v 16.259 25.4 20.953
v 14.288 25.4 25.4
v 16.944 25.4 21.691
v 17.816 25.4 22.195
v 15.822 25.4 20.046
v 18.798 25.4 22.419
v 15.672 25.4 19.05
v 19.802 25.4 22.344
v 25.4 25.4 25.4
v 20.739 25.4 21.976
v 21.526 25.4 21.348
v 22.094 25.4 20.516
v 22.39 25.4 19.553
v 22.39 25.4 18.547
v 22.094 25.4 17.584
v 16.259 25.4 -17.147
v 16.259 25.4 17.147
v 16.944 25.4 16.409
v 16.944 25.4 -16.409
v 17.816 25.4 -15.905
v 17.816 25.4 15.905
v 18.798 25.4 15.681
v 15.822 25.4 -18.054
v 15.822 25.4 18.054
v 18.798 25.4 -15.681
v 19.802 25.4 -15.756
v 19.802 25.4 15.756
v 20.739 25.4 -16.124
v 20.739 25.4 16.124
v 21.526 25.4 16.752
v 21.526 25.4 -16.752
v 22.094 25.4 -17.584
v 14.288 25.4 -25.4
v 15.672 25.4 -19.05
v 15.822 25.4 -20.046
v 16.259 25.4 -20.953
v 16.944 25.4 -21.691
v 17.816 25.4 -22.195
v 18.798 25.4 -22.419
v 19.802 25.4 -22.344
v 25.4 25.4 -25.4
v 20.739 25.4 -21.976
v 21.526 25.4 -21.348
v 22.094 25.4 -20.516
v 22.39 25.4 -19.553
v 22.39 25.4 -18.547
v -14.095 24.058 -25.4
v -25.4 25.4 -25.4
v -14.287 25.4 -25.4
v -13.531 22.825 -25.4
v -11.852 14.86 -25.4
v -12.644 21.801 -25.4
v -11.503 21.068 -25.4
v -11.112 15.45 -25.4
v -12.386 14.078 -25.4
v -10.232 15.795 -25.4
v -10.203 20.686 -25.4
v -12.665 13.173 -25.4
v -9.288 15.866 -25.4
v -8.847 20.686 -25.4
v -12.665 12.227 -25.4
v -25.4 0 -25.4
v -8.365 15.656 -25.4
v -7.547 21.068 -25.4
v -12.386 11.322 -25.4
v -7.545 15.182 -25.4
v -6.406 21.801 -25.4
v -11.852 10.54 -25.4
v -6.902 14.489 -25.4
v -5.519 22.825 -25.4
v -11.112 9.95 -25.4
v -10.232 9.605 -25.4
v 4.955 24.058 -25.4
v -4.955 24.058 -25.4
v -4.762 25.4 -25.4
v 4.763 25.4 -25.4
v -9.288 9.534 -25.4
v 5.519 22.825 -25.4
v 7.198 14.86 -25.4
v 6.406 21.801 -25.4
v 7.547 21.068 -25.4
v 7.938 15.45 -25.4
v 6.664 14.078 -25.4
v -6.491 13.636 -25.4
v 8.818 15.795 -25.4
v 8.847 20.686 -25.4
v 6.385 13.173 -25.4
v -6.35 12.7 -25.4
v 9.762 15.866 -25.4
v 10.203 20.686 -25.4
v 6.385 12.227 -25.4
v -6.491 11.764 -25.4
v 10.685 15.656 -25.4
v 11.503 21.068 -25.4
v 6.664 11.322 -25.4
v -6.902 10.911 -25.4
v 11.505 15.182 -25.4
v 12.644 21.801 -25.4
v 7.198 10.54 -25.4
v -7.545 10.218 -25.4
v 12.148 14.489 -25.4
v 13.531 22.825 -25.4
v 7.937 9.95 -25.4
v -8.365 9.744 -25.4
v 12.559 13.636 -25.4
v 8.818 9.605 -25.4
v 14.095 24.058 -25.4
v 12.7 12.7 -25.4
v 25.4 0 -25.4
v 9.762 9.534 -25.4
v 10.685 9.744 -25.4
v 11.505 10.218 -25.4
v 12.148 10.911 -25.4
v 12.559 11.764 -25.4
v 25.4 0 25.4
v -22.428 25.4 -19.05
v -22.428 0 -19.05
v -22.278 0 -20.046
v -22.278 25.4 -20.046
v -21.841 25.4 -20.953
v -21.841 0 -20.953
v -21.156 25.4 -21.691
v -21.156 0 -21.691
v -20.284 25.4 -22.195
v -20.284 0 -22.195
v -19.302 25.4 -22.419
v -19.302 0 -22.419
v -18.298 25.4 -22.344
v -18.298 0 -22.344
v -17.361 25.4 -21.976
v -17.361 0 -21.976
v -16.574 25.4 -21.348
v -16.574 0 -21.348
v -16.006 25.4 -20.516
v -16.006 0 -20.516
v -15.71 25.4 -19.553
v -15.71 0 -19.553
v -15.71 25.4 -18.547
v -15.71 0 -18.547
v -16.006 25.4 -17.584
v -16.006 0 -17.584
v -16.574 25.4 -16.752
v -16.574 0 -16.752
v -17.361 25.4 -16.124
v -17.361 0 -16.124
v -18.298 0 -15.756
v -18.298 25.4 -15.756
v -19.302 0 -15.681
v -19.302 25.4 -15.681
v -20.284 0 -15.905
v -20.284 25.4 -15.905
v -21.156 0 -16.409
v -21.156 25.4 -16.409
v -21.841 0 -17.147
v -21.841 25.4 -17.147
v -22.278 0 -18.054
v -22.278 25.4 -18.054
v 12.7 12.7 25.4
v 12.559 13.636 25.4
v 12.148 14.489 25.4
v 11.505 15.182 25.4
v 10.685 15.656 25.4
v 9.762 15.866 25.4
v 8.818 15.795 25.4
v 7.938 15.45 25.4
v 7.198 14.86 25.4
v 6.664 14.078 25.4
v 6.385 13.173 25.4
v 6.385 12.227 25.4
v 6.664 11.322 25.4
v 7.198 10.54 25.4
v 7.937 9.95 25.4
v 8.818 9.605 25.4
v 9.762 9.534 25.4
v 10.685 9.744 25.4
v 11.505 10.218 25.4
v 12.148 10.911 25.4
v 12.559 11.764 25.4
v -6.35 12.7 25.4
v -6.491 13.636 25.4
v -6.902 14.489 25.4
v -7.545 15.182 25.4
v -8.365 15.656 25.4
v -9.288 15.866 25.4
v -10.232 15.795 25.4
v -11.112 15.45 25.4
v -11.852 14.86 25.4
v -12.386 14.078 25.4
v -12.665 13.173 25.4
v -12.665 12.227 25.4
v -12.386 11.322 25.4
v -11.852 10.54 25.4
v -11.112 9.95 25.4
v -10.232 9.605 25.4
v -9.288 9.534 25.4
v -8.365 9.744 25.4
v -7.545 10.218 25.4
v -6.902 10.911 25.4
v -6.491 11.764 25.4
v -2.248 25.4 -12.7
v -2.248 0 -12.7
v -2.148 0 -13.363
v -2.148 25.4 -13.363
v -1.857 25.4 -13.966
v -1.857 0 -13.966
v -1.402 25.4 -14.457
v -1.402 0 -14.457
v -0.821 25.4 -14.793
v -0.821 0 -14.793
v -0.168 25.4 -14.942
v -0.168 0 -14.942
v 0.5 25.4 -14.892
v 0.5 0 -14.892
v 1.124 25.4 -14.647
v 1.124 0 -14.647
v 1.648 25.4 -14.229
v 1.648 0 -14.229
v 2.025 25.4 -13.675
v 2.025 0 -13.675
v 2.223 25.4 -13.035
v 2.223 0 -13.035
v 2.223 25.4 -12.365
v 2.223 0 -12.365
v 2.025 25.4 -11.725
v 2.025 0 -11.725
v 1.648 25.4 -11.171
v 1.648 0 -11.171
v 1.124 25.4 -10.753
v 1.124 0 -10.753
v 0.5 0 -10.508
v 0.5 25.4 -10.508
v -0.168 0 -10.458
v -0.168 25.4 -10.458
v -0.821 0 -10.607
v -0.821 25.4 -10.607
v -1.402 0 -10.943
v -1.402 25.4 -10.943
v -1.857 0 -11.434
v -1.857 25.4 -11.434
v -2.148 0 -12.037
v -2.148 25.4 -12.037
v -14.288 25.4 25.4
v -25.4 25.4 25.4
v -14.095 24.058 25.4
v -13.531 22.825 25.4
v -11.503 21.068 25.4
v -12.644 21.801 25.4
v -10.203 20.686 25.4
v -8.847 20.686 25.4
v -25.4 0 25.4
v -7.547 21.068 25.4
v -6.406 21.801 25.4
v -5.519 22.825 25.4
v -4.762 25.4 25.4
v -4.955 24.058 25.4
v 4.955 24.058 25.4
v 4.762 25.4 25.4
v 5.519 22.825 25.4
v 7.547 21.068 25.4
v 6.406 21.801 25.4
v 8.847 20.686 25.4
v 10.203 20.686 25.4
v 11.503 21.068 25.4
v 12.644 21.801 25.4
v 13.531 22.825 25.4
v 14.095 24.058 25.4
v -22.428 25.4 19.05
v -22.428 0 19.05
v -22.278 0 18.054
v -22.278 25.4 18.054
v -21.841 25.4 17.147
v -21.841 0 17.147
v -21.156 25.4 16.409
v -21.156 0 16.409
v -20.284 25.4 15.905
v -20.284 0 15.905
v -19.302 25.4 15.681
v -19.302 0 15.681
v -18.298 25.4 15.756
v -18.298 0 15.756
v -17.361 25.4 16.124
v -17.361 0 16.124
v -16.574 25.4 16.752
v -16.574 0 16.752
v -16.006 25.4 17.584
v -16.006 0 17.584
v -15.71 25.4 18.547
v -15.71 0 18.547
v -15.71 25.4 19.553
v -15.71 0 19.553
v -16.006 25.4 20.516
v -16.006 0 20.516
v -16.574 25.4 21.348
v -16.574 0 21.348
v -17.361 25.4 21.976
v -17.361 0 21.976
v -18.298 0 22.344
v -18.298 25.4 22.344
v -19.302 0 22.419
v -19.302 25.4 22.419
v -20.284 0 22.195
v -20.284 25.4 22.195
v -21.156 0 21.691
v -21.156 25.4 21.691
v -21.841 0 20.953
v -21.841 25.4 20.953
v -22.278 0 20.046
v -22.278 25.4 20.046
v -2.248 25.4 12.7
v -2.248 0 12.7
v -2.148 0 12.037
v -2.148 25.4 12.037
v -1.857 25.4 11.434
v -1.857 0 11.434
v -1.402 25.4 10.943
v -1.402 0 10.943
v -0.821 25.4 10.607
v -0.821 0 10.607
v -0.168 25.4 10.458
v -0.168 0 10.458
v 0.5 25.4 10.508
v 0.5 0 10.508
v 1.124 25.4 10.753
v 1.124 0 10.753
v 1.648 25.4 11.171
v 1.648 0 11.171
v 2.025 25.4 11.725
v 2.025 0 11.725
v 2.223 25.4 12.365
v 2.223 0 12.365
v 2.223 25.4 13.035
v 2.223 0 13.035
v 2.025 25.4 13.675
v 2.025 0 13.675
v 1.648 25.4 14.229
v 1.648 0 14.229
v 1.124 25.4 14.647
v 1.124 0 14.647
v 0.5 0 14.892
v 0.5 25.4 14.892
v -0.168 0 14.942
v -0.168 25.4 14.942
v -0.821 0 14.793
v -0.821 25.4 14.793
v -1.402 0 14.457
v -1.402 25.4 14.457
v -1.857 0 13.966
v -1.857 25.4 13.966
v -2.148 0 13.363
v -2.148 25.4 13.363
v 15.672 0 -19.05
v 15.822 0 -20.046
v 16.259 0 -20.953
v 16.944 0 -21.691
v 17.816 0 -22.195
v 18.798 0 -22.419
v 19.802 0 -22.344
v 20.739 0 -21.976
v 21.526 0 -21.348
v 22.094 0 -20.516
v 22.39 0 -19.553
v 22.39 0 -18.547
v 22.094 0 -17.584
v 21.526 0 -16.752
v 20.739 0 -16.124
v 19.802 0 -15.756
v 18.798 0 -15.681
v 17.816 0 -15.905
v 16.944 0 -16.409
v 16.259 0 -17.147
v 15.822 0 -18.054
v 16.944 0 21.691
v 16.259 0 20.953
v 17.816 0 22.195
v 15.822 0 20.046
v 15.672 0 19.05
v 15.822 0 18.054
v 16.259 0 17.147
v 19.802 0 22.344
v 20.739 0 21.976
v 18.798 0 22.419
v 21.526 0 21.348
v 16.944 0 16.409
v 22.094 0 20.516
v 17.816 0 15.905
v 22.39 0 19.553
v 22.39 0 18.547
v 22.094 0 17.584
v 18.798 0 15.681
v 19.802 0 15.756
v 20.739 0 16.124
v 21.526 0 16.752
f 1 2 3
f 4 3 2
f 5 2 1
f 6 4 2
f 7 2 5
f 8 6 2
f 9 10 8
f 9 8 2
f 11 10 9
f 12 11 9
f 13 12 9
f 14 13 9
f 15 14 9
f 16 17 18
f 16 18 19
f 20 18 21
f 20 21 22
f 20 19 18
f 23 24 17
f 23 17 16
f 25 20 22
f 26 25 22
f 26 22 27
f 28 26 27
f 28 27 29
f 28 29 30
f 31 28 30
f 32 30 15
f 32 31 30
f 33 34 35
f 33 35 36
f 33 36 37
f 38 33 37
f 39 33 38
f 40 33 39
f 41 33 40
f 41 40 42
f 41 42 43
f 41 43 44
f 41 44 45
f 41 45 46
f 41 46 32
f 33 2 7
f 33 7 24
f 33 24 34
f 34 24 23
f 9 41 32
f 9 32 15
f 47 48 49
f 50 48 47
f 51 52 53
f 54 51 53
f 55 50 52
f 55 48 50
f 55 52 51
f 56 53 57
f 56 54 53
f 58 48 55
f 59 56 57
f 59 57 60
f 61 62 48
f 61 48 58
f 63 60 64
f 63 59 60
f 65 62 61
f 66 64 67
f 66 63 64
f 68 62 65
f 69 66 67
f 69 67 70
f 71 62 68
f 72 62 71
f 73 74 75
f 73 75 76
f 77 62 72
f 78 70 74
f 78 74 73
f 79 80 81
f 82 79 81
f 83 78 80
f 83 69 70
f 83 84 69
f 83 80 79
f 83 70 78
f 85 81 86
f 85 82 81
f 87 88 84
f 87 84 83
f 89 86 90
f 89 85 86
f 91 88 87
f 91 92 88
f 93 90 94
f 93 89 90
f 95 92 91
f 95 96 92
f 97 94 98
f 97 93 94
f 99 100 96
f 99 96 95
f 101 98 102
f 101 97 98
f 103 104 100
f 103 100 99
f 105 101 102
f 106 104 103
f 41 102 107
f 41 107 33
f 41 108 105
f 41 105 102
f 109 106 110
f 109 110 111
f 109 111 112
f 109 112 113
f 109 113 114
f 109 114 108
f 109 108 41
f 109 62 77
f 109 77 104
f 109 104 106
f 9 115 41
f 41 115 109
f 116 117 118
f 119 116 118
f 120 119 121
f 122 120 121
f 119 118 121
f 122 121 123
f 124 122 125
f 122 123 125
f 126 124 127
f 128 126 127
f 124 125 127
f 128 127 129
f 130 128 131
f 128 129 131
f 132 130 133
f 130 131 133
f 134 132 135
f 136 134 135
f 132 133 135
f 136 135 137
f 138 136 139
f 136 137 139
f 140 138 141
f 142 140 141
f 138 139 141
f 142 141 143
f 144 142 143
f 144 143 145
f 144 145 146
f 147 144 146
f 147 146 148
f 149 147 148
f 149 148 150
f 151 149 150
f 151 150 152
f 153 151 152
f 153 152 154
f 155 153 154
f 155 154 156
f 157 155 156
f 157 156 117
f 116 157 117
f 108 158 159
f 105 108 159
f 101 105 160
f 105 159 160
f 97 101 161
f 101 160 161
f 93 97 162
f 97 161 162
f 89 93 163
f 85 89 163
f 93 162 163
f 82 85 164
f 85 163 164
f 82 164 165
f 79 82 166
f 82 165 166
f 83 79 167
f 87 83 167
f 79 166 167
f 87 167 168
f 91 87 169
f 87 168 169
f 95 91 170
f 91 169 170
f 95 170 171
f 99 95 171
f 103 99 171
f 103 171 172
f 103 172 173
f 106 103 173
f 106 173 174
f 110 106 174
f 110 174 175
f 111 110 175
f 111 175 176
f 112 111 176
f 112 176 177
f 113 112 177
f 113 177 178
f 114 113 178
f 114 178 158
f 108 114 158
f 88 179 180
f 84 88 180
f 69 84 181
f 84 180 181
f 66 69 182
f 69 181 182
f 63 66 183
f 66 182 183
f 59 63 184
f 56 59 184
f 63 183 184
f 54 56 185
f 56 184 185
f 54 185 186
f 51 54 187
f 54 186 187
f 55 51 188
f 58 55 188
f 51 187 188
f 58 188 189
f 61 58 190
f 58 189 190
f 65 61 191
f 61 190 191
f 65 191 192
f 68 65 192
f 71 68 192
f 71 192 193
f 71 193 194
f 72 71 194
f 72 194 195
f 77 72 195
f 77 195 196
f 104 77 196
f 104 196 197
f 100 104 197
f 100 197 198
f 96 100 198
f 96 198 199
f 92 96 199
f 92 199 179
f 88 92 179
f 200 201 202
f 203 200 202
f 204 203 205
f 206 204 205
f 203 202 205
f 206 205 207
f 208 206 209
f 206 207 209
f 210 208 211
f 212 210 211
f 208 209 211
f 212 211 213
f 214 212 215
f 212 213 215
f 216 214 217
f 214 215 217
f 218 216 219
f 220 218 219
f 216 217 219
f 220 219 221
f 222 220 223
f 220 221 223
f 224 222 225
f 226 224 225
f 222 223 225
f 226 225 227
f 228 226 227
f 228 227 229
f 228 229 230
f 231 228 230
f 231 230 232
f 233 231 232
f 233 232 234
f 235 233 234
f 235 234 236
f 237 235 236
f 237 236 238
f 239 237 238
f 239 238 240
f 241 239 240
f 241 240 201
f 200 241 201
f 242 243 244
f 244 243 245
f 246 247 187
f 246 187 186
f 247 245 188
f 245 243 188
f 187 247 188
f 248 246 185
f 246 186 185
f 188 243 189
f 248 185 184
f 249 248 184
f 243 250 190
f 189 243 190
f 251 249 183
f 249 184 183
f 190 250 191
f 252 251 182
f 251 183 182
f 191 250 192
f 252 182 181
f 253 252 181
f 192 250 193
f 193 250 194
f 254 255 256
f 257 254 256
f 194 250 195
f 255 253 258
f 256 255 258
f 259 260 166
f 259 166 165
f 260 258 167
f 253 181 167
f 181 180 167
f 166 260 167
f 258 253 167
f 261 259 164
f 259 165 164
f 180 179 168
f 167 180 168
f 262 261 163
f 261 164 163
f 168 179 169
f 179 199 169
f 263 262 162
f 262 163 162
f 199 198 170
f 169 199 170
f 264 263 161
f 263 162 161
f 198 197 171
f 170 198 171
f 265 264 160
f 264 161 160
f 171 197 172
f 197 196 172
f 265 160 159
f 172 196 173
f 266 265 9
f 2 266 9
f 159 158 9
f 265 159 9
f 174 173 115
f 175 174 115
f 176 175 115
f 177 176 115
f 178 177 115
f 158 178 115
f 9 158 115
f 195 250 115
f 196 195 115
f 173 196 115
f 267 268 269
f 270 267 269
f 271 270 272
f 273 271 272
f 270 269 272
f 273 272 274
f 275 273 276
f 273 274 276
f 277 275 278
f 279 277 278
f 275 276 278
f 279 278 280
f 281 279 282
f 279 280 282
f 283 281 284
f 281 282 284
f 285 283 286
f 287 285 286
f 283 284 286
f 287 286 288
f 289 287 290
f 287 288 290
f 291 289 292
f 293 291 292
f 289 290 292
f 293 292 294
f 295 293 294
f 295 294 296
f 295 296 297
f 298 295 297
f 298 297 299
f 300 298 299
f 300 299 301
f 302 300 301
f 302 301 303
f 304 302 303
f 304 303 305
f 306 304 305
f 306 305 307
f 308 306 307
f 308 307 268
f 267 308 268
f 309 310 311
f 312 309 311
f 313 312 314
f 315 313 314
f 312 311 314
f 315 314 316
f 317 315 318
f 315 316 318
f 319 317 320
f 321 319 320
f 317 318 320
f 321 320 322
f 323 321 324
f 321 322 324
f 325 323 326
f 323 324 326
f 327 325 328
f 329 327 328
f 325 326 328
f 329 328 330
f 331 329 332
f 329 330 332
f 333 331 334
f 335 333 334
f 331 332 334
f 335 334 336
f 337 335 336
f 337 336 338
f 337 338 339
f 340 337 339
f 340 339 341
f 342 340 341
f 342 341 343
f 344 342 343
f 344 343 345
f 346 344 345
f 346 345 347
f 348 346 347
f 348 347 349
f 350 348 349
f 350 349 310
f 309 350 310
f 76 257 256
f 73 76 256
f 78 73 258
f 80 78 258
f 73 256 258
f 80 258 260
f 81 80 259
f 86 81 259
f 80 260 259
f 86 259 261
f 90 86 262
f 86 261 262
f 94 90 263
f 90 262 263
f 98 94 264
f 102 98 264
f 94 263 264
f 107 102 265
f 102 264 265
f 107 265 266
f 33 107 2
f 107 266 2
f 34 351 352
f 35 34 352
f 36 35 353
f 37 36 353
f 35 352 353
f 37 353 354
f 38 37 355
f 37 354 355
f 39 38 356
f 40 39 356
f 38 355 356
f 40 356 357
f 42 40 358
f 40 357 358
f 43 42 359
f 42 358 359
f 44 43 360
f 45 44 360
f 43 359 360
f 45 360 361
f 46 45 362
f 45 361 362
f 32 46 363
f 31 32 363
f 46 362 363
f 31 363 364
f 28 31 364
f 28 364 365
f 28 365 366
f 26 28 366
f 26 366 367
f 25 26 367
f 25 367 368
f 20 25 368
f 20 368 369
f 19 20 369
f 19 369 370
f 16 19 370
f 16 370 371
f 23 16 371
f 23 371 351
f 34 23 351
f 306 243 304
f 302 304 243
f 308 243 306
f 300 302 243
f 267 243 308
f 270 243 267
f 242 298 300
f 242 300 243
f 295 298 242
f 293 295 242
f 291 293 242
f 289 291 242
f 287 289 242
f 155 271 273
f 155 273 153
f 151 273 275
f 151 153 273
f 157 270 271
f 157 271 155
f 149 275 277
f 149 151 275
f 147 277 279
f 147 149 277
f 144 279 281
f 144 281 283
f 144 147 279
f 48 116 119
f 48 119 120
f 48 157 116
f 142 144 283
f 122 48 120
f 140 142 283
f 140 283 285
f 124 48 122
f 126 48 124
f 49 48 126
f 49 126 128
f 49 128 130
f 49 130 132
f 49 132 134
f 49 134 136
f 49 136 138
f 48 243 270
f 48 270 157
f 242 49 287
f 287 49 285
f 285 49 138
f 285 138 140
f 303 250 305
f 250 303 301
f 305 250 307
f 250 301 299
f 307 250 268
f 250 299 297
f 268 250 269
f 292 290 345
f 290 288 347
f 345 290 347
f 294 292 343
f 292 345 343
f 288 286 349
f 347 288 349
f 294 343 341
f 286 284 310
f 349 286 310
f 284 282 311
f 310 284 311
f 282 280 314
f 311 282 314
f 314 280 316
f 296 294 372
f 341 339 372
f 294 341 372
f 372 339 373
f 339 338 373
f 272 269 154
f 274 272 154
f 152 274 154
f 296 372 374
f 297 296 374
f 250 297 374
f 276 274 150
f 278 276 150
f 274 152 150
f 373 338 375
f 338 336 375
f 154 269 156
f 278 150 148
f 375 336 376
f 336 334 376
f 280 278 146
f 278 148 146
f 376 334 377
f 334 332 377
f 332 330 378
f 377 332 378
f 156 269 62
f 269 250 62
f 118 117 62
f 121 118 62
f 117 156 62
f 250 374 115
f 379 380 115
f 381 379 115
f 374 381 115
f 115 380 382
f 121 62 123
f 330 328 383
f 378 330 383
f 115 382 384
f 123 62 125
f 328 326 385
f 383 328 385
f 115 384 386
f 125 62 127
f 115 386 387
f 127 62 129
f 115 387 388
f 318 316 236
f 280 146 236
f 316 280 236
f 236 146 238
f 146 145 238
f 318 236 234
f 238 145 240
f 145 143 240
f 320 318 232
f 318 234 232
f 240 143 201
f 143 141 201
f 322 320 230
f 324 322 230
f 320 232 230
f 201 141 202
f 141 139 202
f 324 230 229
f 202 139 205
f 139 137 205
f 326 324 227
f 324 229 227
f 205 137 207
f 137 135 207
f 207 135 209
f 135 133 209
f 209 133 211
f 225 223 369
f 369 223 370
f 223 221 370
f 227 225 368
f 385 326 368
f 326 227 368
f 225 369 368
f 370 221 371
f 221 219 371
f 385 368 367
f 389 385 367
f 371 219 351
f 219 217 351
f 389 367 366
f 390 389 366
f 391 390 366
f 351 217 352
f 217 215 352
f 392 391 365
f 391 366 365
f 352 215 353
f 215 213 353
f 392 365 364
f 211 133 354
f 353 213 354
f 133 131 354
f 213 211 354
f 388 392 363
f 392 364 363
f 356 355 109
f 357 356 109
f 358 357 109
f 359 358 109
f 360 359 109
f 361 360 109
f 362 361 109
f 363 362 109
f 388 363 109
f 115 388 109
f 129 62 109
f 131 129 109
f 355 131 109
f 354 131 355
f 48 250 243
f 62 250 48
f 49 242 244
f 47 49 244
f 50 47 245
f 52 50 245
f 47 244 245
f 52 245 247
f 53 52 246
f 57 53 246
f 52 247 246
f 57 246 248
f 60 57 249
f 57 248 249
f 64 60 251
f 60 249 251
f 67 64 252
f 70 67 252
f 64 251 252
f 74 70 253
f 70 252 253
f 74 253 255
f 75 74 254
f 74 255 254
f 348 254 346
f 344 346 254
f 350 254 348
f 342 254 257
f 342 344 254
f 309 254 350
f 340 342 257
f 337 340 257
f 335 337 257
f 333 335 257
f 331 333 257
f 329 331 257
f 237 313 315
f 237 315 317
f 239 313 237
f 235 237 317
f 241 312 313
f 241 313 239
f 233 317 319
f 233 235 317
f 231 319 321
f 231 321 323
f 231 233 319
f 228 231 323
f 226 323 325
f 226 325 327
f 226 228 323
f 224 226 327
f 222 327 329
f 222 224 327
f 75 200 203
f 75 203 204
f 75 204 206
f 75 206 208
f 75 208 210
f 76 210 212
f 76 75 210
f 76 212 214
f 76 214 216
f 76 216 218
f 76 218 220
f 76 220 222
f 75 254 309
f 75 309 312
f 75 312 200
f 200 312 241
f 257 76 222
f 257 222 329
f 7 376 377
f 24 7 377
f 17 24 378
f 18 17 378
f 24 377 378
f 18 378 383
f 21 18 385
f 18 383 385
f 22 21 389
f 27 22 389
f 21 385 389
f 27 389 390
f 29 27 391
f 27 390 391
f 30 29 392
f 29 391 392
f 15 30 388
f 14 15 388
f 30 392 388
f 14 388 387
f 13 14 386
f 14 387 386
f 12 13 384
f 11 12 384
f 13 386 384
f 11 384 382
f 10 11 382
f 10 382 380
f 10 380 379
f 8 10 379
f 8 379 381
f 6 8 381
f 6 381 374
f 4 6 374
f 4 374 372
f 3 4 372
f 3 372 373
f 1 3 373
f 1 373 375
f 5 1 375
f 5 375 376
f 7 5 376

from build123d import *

# Parameters (mm, degrees)
SKETCH1_W               = 50.8
SKETCH1_H               = 50.8
BOSS_EXTRUDE1_DEPTH     = 25.4
SKETCH2_R               = 4.7625
CUT_EXTRUDE1_DEPTH      = 63.217039467
F_1_4_CLEARANCE_HOLE1_D = 6.7564
SKETCH6_R               = 3.175
CUT_EXTRUDE2_DEPTH      = 63.217039467
F_8_CLEARANCE_HOLE1_D   = 4.4958


with BuildPart() as part:
    # Sketch1 → Boss-Extrude1 (new body)
    with BuildSketch(Plane(origin=(0, 0, 0), x_dir=(1, 0, 0), z_dir=(0, 1, 0))):
        Rectangle(SKETCH1_W, SKETCH1_H)
    extrude(amount=BOSS_EXTRUDE1_DEPTH)

    # Sketch2 → Cut-Extrude1 (cut, through all)
    with BuildSketch(Plane.XY.offset(25.4)):
        with Locations((-9.525, 25.4)):
            Circle(SKETCH2_R)
        with Locations((9.525, 25.4)):
            Circle(SKETCH2_R)
    extrude(amount=-CUT_EXTRUDE1_DEPTH, mode=Mode.SUBTRACT)

    # 1/4 Clearance Hole1 (through all)
    with Locations(Plane(origin=(0, 25.4, 0), x_dir=(1, 0, 0), z_dir=(0, 1, 0))):
        with Locations((-19.05, 19.05), (-19.05, -19.05), (19.05, -19.05), (19.05, 19.05)):
            Hole(F_1_4_CLEARANCE_HOLE1_D / 2)

    # Sketch6 → Cut-Extrude2 (cut, through all)
    with BuildSketch(Plane.XY.offset(25.4)):
        with Locations((-9.525, 12.7)):
            Circle(SKETCH6_R)
        with Locations((9.525, 12.7)):
            Circle(SKETCH6_R)
    extrude(amount=-CUT_EXTRUDE2_DEPTH, mode=Mode.SUBTRACT)

    # #8 Clearance Hole1 (through all)
    with Locations(Plane(origin=(0, 25.4, 0), x_dir=(1, 0, 0), z_dir=(0, 1, 0))):
        with Locations((0, 12.7), (0, -12.7)):
            Hole(F_8_CLEARANCE_HOLE1_D / 2)


solid = part.part
